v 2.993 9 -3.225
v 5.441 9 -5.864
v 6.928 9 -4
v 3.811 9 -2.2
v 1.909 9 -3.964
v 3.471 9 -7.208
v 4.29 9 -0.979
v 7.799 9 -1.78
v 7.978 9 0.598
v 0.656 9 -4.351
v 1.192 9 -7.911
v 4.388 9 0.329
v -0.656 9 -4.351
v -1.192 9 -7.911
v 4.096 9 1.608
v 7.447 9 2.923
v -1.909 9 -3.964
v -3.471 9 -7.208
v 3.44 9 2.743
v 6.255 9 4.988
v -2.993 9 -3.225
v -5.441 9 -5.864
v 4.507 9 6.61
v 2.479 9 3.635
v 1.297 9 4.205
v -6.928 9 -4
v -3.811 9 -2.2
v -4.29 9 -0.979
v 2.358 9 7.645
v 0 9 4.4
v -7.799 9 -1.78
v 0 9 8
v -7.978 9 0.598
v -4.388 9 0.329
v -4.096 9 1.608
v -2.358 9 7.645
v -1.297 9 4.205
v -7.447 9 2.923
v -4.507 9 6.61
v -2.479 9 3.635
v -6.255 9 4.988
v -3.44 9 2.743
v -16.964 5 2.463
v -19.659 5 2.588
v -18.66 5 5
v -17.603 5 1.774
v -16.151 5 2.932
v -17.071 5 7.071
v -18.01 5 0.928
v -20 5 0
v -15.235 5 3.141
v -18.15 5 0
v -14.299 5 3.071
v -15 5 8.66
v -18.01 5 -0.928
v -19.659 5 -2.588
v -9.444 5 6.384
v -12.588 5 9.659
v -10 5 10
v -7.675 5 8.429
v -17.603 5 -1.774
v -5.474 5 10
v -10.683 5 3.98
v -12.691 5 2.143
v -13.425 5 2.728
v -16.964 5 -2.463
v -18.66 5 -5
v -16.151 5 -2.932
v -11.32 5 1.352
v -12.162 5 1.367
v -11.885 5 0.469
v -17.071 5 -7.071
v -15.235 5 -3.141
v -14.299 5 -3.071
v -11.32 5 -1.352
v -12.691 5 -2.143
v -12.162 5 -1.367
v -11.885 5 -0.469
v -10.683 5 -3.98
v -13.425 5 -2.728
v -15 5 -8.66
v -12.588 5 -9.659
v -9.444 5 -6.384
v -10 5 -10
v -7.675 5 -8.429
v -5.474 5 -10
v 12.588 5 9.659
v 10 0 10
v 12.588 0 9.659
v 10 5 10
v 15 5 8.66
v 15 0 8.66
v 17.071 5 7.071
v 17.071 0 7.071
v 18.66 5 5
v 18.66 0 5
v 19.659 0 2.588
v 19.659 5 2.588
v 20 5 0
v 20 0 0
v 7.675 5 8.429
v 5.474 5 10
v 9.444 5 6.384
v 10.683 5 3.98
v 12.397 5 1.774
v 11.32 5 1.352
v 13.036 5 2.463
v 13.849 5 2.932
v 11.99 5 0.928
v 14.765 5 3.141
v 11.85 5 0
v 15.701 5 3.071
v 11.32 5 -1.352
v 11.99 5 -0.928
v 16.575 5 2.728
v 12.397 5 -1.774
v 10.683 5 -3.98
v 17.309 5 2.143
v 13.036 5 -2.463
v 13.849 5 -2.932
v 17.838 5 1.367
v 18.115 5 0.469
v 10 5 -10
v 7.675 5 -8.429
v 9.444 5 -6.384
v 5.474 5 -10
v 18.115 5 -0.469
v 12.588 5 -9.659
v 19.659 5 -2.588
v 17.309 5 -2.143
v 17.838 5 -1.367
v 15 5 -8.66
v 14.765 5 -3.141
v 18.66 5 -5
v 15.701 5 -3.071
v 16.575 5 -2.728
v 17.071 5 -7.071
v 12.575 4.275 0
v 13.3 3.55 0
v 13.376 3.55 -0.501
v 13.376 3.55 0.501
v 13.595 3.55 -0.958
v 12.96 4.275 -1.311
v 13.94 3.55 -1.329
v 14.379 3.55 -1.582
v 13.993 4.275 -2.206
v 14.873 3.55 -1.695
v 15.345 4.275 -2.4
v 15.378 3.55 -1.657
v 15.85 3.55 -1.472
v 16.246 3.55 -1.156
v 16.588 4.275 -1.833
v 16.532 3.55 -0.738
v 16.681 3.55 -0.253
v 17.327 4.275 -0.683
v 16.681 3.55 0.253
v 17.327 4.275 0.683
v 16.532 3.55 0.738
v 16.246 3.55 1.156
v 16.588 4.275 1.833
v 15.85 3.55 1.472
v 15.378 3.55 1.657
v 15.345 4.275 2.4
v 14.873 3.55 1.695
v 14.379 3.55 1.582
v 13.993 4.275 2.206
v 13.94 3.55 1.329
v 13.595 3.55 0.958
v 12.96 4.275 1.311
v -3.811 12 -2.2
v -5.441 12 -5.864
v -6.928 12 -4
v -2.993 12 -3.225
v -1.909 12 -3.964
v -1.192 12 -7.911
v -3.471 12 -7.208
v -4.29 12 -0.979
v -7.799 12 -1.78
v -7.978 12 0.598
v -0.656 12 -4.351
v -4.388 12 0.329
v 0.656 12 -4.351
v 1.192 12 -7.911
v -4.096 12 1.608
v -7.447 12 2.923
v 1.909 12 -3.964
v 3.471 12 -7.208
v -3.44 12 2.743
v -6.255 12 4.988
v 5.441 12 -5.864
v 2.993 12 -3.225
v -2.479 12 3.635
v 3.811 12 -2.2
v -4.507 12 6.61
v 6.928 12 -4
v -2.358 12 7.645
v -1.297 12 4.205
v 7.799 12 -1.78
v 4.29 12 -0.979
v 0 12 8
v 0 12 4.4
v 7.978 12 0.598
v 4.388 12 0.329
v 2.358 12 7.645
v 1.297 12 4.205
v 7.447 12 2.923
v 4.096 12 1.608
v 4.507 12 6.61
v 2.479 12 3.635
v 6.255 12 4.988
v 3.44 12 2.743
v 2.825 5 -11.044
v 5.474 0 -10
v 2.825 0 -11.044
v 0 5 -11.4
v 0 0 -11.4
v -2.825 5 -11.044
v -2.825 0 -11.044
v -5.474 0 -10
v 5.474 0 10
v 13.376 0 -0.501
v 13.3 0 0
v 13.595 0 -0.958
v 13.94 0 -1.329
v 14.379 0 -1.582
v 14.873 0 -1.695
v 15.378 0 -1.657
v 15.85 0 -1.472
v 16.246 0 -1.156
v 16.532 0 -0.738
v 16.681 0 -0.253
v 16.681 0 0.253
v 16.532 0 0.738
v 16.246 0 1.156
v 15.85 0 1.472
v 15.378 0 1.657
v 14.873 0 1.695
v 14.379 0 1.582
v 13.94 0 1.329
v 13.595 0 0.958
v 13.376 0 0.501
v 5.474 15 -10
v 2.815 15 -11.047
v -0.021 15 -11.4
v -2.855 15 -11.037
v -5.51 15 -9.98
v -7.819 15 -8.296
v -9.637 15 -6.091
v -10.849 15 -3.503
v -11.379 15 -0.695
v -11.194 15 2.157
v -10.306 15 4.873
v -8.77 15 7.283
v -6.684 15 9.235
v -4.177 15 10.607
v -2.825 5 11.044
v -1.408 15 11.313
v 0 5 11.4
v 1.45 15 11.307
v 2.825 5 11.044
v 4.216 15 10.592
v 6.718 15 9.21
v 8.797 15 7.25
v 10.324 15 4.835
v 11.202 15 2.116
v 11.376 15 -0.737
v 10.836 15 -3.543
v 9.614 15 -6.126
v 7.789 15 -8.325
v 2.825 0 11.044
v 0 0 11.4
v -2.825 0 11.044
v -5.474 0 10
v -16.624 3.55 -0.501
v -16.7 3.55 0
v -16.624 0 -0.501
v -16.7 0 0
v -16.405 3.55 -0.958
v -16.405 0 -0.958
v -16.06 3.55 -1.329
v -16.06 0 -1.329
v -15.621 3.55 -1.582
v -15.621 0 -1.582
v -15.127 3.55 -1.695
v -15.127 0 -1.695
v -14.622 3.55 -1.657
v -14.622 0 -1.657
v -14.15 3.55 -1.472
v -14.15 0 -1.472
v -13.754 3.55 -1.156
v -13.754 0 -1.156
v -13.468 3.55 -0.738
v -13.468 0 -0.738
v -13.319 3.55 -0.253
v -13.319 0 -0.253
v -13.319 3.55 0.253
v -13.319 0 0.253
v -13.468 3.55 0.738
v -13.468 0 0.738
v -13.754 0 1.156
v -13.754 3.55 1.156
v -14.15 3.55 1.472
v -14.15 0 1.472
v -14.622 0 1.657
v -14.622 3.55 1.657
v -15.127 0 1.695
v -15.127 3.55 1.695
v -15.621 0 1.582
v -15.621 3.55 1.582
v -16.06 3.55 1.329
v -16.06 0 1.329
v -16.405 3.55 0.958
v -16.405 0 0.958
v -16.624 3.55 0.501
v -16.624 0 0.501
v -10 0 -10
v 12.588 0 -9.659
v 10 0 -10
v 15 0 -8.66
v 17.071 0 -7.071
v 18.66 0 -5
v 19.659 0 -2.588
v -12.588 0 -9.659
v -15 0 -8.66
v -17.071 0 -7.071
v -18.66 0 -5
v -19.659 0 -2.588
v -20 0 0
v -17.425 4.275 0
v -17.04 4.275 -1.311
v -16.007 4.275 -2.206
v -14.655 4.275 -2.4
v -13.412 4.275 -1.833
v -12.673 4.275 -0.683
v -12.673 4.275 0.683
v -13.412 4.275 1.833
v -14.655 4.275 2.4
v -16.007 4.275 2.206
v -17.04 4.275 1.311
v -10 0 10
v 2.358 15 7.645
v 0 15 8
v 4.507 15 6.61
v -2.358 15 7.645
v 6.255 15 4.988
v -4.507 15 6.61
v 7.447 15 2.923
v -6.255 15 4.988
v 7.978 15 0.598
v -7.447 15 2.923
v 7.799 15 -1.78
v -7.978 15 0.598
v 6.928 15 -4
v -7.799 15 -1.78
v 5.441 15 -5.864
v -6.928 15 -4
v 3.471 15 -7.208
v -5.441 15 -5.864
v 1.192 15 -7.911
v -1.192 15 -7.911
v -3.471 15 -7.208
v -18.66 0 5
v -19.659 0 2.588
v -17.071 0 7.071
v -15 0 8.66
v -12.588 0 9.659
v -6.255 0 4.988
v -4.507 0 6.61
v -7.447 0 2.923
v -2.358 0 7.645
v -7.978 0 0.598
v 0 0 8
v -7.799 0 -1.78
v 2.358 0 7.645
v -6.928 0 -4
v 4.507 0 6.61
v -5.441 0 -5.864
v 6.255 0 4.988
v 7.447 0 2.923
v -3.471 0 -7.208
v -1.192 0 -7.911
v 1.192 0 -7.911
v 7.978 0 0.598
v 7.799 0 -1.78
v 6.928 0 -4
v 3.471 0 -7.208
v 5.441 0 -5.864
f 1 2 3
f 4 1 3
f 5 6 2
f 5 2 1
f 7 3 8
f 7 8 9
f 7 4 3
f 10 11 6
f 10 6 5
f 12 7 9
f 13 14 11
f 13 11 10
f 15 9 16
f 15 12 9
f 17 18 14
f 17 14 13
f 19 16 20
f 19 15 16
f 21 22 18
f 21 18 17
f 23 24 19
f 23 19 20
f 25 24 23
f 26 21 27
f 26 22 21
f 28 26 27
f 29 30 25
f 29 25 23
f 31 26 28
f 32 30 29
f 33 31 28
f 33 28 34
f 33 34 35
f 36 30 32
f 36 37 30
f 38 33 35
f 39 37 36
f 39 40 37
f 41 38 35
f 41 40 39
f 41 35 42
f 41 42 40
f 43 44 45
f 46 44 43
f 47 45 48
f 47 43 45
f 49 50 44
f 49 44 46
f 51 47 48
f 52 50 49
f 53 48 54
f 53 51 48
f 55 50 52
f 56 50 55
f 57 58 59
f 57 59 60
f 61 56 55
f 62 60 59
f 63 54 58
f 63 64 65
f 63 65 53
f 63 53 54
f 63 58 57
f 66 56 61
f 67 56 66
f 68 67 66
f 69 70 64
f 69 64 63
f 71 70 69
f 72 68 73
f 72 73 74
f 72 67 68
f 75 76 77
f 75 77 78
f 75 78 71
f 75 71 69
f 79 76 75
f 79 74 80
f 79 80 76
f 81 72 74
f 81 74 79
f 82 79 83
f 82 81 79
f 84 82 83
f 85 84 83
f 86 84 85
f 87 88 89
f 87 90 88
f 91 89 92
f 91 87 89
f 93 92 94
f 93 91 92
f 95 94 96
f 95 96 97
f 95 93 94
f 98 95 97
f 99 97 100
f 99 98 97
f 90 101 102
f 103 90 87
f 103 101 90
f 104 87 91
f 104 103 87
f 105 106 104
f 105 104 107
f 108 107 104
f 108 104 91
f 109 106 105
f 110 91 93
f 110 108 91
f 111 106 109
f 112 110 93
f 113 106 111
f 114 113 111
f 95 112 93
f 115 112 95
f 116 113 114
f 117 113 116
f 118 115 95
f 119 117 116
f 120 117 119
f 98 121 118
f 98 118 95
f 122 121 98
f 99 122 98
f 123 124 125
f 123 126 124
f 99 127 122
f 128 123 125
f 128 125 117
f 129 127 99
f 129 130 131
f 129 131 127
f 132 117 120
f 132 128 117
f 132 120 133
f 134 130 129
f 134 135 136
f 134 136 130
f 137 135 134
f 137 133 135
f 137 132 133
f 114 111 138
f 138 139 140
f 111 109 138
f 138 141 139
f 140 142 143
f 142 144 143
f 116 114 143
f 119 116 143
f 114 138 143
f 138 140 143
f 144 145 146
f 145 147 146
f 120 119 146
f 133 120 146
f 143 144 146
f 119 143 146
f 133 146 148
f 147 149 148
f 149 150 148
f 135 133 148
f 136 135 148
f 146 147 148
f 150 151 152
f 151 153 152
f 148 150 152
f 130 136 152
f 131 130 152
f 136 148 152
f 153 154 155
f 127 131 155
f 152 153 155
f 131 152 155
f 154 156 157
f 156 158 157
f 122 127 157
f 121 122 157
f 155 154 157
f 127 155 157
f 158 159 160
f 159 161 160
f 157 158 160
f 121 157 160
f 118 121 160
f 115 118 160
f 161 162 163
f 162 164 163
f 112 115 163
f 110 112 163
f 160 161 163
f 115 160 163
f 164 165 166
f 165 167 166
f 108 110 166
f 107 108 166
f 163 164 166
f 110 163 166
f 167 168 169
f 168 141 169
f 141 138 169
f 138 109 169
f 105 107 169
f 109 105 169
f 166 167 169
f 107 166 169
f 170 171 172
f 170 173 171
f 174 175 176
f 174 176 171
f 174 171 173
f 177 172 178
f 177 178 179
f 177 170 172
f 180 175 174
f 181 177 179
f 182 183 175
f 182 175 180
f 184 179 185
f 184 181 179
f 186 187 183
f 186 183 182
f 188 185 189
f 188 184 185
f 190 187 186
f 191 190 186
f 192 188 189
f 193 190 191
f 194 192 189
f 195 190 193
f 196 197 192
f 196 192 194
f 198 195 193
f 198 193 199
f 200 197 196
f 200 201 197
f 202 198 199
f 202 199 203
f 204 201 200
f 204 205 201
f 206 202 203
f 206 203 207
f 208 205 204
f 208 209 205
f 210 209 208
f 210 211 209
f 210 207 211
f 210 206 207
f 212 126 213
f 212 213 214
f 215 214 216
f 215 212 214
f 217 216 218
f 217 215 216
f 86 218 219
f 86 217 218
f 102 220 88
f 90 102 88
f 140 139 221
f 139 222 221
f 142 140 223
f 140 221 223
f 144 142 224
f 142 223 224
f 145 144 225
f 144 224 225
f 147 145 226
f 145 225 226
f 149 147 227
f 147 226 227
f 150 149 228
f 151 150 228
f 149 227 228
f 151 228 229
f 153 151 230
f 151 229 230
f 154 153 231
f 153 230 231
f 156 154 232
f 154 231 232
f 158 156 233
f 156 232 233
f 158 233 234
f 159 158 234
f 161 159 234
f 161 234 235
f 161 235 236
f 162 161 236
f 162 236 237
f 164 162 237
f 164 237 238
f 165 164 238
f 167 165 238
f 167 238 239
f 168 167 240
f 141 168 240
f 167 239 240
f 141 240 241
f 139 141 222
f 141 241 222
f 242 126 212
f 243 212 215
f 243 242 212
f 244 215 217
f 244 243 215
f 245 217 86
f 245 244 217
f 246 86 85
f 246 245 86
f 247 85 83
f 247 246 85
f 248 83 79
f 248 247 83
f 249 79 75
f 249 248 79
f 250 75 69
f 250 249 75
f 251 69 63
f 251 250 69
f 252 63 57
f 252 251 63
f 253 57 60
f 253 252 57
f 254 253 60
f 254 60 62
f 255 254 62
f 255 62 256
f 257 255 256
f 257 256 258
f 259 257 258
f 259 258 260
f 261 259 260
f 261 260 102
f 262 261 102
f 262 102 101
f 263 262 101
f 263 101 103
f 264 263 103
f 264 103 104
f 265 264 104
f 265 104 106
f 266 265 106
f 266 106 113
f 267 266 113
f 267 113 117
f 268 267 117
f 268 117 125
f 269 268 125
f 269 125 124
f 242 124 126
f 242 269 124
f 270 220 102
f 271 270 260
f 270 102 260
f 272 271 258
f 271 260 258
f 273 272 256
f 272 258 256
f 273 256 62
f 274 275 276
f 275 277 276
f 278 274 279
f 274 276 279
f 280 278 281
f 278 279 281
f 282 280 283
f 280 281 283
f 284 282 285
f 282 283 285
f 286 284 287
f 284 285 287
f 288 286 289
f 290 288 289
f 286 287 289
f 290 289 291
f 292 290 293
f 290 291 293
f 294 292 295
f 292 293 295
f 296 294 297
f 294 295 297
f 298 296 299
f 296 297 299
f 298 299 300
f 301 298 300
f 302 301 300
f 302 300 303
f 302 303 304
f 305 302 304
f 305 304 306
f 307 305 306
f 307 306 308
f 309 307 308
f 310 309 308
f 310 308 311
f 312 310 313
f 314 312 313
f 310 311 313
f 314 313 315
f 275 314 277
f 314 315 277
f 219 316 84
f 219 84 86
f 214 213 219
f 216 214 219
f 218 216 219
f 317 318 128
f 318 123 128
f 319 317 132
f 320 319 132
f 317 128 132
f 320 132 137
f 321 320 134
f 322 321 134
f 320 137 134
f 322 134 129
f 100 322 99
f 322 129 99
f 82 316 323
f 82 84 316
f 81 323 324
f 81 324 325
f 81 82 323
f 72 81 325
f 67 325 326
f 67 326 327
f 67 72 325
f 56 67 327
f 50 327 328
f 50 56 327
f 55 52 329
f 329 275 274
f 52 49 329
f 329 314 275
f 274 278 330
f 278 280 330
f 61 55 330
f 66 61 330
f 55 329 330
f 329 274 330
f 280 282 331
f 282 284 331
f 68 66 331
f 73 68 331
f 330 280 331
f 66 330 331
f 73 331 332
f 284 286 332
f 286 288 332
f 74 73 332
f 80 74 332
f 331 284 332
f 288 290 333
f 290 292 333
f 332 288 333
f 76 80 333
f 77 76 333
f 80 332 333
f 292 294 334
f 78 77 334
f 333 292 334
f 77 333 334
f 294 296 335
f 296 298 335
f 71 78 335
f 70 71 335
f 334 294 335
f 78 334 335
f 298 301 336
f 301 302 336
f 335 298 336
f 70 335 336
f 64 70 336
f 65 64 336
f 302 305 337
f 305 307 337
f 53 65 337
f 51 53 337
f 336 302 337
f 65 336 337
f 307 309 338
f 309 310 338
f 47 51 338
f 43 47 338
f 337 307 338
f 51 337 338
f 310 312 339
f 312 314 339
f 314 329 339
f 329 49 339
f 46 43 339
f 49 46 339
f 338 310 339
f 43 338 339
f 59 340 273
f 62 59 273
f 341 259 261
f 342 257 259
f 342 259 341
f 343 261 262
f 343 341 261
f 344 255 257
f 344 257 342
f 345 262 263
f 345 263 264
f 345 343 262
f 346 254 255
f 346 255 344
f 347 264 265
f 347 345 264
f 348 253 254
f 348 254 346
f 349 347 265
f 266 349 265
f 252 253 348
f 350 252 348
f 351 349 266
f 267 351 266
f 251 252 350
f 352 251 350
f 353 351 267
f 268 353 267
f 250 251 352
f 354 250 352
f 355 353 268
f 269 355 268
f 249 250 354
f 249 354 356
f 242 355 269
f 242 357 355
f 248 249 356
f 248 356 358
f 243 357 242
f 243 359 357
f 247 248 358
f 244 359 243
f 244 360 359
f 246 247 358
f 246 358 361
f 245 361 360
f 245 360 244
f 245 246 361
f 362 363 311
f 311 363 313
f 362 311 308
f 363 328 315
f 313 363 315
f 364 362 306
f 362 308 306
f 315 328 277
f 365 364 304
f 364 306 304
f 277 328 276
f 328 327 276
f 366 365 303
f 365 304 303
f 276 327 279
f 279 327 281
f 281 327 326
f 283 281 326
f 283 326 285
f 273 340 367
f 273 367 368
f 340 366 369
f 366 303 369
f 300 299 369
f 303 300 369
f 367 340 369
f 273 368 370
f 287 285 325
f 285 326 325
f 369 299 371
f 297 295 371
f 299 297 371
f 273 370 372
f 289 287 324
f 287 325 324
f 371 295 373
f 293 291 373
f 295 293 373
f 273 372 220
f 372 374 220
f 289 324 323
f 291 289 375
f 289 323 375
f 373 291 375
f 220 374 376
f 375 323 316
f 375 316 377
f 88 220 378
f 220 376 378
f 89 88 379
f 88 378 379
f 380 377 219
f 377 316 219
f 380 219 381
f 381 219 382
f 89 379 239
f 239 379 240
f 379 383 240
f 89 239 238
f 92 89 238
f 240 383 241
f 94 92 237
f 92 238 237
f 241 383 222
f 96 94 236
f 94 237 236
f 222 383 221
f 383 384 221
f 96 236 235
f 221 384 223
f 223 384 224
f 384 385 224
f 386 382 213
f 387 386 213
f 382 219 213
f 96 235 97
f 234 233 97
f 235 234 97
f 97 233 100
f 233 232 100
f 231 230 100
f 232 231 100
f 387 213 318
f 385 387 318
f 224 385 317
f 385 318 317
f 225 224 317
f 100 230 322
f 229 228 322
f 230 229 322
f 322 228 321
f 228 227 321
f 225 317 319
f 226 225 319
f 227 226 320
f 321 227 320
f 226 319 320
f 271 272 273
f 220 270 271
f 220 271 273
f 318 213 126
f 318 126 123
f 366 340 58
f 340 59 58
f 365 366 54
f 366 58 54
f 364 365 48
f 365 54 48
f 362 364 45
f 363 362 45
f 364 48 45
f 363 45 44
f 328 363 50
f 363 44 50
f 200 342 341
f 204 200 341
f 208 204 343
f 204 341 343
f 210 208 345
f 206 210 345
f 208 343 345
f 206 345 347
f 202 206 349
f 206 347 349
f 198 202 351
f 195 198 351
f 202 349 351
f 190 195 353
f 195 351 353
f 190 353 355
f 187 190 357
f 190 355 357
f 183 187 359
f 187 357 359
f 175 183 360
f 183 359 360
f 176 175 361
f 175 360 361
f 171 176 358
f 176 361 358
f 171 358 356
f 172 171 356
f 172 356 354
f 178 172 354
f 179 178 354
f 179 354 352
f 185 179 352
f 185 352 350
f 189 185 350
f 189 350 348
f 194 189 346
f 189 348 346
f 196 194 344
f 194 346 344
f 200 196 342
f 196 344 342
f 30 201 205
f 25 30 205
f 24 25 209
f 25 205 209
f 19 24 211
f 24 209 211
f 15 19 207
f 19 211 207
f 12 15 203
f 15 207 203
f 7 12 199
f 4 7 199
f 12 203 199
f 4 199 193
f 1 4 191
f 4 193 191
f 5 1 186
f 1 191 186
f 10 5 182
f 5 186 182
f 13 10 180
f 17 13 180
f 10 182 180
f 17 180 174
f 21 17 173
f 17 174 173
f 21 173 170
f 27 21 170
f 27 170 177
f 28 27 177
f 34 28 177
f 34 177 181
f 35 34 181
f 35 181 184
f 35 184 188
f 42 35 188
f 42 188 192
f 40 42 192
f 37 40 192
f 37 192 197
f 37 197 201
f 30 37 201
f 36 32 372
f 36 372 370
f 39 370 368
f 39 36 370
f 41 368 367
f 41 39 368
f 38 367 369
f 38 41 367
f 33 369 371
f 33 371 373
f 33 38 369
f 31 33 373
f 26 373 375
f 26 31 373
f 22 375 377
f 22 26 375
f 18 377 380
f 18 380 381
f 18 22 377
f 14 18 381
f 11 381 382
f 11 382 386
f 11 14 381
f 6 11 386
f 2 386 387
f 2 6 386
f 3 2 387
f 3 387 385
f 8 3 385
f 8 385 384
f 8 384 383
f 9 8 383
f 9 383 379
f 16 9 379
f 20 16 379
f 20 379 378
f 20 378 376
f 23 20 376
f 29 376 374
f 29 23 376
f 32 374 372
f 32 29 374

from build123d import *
from build123d.topology import SkipClean

# Parameters (mm, degrees)
SKETCH1_W                                       = 40
SKETCH1_H                                       = 20
BOSS_EXTRUDE1_DEPTH                             = 5
CSK_FOR_M3_FLAT_HEAD_MACHINE_SCREW1_D           = 3.4
CSK_FOR_M3_FLAT_HEAD_MACHINE_SCREW1_CSINK_D     = 6.3
CSK_FOR_M3_FLAT_HEAD_MACHINE_SCREW1_CSINK_ANGLE = 90
SKETCH4_R                                       = 4.4
CUT_EXTRUDE1_DEPTH                              = 5
BOSS_EXTRUDE2_START                             = 10
SKETCH5_R                                       = 11.4
SKETCH5_R_2                                     = 4.4
BOSS_EXTRUDE2_DEPTH                             = 10
FILLET1_R                                       = 10
SKETCH6_R                                       = 8
SKETCH6_R_2                                     = 4.4
CUT_EXTRUDE2_DEPTH                              = 3
CUT_EXTRUDE3_START                              = -9
SKETCH7_R                                       = 8
CUT_EXTRUDE3_DEPTH                              = 9
BOSS_EXTRUDE3_START                             = -5
BOSS_EXTRUDE3_DEPTH                             = 5


with BuildPart() as part:
    # Sketch1 → Boss-Extrude1 (new body)
    with BuildSketch(Plane(origin=(0, 0, 0), x_dir=(1, 0, 0), z_dir=(0, 1, 0))):
        Rectangle(SKETCH1_W, SKETCH1_H)
    extrude(amount=BOSS_EXTRUDE1_DEPTH)

    # CSK for M3 Flat Head Machine Screw1 (through all)
    with Locations(Plane(origin=(0, 5, 0), x_dir=(1, 0, 0), z_dir=(0, 1, 0))):
        with Locations((15, 0), (-15, 0)):
            CounterSinkHole(CSK_FOR_M3_FLAT_HEAD_MACHINE_SCREW1_D / 2, CSK_FOR_M3_FLAT_HEAD_MACHINE_SCREW1_CSINK_D / 2, counter_sink_angle=CSK_FOR_M3_FLAT_HEAD_MACHINE_SCREW1_CSINK_ANGLE)

    # Sketch4 → Cut-Extrude1 (cut)
    with BuildSketch(Plane(origin=(0, 5, 0), x_dir=(1, 0, 0), z_dir=(0, 1, 0))):
        with Locations(Location((0, 0, 0), (0, 0, 270))):
            Circle(SKETCH4_R)
    extrude(amount=-CUT_EXTRUDE1_DEPTH, mode=Mode.SUBTRACT)

    # Sketch5 → Boss-Extrude2 (add)
    with BuildSketch(Plane(origin=(0, 5, 0), x_dir=(1, 0, 0), z_dir=(0, 1, 0)).offset(BOSS_EXTRUDE2_START)):
        with Locations(Location((0, 0, 0), (0, 0, 61.305586473))):
            Circle(SKETCH5_R)
        with Locations(Location((0, 0, 0), (0, 0, 270))):
            Circle(SKETCH5_R_2, mode=Mode.SUBTRACT)
    extrude(amount=-BOSS_EXTRUDE2_DEPTH)

    # Fillet1
    fillet1_edges = [part.edges().sort_by_distance(p)[0] for p in [
        (20, 2.5, 10),
        (-20, 2.5, -10),
        (20, 2.5, -10),
        (-20, 2.5, 10),
    ]]
    fillet(fillet1_edges, radius=FILLET1_R - 0.0001)  # a hair under: the kernel refuses the full size

    # Sketch6 → Cut-Extrude2 (cut)
    with BuildSketch(Plane(origin=(0, 15, 0), x_dir=(1, 0, 0), z_dir=(0, 1, 0))):
        with Locations(Location((0, 0, 0), (0, 0, 270))):
            Circle(SKETCH6_R)
        with Locations(Location((0, 0, 0), (0, 0, 270))):
            Circle(SKETCH6_R_2, mode=Mode.SUBTRACT)
    extrude(amount=-CUT_EXTRUDE2_DEPTH, mode=Mode.SUBTRACT)

    # Sketch7 → Cut-Extrude3 (cut)
    with BuildSketch(Plane.XZ.offset(CUT_EXTRUDE3_START)):
        with Locations(Location((0, 0, 0), (0, 0, 90))):
            Circle(SKETCH7_R)
    extrude(amount=CUT_EXTRUDE3_DEPTH, mode=Mode.SUBTRACT)

    # Sketch8 → Boss-Extrude3 (add)
    with SkipClean():  # the faces are left unmerged after this step: merging them gives an invalid solid
        with BuildSketch(Plane.XZ.offset(BOSS_EXTRUDE3_START)):
            with BuildLine():
                Line((-5.473572873, 10), (5.473572873, 10))
                ThreePointArc((5.473572873, 10), (0, 11.4), (-5.473572873, 10))
            make_face()
            with BuildLine():
                Line((-5.473572873, -10), (5.473572873, -10))
                ThreePointArc((5.473572873, -10), (0, -11.4), (-5.473572873, -10))
            make_face()
        extrude(amount=BOSS_EXTRUDE3_DEPTH)


solid = part.part
